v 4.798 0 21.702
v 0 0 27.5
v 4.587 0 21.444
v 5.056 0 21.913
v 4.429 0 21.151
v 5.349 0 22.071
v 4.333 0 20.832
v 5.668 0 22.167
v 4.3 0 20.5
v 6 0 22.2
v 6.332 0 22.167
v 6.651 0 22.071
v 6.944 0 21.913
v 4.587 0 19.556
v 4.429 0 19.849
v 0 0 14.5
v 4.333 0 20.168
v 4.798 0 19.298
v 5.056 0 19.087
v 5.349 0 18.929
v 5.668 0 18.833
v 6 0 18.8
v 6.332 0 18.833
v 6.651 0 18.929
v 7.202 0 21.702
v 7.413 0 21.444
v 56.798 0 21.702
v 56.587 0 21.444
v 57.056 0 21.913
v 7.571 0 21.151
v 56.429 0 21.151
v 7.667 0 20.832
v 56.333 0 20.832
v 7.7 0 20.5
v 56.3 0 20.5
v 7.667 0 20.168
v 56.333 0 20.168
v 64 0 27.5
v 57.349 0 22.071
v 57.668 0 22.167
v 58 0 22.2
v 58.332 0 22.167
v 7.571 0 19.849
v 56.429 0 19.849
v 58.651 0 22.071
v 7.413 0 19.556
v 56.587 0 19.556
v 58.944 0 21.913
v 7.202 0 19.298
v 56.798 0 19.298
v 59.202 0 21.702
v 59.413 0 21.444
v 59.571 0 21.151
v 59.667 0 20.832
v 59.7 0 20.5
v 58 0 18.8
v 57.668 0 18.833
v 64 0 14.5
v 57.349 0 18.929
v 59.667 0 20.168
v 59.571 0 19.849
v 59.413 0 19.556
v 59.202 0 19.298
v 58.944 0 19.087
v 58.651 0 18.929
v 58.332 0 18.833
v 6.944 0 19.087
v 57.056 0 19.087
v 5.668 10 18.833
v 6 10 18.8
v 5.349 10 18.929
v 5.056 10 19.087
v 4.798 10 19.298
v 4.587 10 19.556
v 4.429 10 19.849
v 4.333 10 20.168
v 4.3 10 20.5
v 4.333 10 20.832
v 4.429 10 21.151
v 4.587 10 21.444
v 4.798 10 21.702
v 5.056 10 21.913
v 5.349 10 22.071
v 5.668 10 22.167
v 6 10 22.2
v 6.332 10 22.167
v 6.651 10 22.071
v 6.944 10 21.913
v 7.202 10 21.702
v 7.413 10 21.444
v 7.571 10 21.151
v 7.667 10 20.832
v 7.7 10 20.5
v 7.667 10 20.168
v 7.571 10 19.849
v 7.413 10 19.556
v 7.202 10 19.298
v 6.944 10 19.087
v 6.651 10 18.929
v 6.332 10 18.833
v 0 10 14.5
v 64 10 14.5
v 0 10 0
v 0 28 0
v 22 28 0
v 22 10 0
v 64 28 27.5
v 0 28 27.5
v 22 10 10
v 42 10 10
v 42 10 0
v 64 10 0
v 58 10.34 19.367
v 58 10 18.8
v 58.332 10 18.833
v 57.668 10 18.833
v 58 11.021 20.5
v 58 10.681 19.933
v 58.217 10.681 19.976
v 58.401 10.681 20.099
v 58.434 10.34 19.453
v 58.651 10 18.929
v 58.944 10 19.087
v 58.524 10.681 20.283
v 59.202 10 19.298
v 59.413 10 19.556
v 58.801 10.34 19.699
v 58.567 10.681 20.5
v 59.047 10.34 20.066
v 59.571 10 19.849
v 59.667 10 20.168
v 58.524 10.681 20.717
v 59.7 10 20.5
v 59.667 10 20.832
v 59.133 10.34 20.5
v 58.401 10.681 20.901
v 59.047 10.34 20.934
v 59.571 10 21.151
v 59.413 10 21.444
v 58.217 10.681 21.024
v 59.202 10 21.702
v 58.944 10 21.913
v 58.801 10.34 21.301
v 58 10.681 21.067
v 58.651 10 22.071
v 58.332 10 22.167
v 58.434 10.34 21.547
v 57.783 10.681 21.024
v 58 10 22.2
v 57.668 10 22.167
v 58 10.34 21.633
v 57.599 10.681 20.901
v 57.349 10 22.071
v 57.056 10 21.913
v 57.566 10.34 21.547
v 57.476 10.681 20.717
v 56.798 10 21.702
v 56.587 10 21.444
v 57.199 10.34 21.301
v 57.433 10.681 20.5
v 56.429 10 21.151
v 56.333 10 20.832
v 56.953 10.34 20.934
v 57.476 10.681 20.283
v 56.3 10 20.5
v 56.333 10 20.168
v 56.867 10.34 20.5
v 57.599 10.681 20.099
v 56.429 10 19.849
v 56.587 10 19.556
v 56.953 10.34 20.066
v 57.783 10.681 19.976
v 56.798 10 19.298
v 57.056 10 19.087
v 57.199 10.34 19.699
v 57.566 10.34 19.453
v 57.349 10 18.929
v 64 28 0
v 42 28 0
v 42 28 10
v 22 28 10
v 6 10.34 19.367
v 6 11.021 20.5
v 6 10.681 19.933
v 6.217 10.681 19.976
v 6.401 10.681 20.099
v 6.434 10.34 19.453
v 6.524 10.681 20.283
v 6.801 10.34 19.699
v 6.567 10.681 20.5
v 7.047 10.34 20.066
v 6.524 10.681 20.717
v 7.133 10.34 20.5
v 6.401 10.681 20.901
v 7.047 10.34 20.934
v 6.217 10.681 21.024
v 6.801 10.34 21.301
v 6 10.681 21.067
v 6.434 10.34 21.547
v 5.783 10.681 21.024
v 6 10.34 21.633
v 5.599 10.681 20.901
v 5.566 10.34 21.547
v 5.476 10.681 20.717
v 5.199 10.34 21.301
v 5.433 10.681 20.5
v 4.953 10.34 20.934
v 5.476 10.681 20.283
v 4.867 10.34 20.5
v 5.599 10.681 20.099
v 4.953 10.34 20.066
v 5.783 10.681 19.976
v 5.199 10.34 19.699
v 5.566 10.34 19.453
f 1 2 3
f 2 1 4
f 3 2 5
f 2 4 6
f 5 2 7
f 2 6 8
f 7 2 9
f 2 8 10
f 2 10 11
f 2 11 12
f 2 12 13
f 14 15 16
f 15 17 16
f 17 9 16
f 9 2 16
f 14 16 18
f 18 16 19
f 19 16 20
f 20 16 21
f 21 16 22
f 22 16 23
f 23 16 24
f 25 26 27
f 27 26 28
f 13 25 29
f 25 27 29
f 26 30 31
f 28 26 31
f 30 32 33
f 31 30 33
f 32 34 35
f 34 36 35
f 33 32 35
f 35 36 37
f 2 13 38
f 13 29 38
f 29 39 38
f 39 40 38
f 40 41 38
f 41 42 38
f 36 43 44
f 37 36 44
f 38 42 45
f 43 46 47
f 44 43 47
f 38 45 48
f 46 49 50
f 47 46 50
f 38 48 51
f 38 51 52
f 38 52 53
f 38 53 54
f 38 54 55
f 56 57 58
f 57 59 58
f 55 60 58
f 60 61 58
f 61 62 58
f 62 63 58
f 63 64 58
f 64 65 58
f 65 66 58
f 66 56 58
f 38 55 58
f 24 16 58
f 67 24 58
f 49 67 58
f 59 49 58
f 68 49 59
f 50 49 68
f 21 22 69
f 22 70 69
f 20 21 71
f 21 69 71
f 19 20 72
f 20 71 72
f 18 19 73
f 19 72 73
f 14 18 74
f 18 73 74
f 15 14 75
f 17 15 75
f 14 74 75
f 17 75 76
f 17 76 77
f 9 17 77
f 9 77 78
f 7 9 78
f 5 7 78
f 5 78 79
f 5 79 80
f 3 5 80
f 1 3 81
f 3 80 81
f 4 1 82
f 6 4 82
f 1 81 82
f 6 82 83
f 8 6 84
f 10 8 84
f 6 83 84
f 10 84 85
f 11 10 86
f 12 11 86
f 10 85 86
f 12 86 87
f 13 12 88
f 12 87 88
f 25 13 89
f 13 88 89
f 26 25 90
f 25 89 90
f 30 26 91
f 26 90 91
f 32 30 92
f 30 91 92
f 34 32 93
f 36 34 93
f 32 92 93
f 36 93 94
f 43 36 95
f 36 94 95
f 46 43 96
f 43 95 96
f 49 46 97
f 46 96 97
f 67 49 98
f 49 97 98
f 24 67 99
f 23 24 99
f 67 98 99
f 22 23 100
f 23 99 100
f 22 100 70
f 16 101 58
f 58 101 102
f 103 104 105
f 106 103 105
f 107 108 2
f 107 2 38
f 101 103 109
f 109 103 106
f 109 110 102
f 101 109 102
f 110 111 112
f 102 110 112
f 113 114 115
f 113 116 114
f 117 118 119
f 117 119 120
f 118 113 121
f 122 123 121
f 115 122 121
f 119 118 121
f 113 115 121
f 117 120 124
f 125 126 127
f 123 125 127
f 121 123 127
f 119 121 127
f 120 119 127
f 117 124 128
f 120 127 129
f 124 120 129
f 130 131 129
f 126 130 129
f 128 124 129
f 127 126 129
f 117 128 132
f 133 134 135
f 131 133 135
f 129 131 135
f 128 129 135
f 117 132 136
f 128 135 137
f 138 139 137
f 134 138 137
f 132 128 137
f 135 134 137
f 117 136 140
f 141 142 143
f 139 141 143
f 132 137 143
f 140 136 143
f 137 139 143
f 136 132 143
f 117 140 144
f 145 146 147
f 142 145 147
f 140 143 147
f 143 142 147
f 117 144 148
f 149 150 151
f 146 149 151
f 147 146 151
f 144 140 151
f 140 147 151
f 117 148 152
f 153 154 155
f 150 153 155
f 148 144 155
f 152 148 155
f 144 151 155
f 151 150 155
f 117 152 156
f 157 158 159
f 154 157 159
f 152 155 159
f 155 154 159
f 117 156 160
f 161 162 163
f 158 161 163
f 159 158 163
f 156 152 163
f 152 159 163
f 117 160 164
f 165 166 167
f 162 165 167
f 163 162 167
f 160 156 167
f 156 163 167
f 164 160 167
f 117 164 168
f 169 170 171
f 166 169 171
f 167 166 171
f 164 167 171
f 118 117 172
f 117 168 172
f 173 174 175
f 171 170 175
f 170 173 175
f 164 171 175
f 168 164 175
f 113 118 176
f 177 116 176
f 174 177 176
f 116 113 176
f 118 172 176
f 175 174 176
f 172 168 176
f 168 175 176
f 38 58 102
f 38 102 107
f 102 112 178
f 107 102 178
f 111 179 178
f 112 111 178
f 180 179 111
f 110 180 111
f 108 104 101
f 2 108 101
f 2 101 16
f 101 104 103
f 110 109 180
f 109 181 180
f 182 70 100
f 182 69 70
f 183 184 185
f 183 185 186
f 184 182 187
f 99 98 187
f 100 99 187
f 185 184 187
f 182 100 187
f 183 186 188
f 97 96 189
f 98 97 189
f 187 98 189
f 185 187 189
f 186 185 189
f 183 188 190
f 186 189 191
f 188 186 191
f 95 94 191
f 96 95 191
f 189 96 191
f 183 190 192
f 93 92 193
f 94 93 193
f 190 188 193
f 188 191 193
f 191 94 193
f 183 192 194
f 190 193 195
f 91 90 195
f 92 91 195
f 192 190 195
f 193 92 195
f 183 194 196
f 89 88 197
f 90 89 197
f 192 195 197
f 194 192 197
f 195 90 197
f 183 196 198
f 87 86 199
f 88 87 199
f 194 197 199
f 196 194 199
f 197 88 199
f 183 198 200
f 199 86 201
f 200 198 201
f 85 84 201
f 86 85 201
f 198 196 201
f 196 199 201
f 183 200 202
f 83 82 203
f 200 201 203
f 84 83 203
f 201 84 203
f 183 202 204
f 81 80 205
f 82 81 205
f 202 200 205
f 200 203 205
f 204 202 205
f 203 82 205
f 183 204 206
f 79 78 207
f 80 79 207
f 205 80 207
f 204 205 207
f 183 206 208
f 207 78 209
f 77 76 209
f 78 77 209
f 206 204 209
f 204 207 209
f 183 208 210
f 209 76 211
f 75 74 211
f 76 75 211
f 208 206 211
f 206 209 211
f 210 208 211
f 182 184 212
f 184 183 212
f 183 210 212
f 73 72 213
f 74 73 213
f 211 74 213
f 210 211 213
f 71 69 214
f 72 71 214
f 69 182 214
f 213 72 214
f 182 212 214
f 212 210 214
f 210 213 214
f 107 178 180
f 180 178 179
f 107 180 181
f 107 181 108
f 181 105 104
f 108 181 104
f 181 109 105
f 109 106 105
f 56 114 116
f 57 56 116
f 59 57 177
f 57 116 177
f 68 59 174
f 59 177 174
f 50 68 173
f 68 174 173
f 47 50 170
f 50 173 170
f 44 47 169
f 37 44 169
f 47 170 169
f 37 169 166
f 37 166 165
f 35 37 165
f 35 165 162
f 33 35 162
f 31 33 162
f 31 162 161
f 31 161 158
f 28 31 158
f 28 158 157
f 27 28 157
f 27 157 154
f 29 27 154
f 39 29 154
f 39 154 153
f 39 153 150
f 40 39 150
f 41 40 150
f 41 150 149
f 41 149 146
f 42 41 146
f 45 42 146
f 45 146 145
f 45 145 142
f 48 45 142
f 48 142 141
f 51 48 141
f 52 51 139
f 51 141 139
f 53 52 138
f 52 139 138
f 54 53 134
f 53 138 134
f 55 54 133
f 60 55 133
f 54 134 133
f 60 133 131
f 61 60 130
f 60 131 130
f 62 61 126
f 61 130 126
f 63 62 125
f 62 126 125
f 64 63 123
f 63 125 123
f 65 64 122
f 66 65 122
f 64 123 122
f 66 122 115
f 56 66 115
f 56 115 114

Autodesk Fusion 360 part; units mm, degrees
sketch "Sketch1" plane through (0, 0, 0) normal (0, 0, 1) x (1, 0, 0)
  line L0 (0, 0) -> (64, 0)
  line L1 (64, 0) -> (64, 28)
  line L2 (64, 28) -> (0, 28)
  line L3 (0, 28) -> (0, 0)
  line L4 (0, 0) -> (0, 10)
  line L5 (0, 10) -> (64, 10)
  line L6 (32, 28) -> (42, 28)
  line L7 (32, 28) -> (22, 28)
  line L8 (22, 28) -> (42, 28)
  line L9 (42, 28) -> (42, 10)
  line L10 (42, 10) -> (22, 10)
  line L11 (22, 10) -> (22, 28)
  point P0 (32, 28)
  dimension "d1" = 64
  dimension "d2" = 28
  dimension "d3" = 10
extrude "Extrude1" add sketch "Sketch1" along normal blind 27.5
extrude "Extrude2" cut sketch "Sketch1" along normal blind 14.5 contours L0 L1 L3 L4 L5 L10
sketch "Sketch2" plane through (0, 0, 0) normal (0, -1, 0) x (1, 0, 0)
  line L0 (0, 14.5) -> (64, 14.5)
  line L1 (64, 14.5) -> (64, 27.5)
  line L2 (64, 27.5) -> (0, 27.5)
  line L3 (0, 27.5) -> (0, 14.5)
  line L4 (64, 14.5) -> (58, 14.5) construction
  line L5 (64, 14.5) -> (64, 20.5) construction
  line L6 (0, 14.5) -> (6, 14.5)
  line L7 (0, 14.5) -> (0, 20.5)
  point P0 (58, 20.5)
  point P1 (6, 20.5)
  dimension "d8" = 6
  dimension "d9" = 6
  dimension "d10" = 6
  dimension "d11" = 6
hole "Hole1" at (6, 0, 20.5) direction (0, 1, 0) diameter 3.4 depth 10 tip angle 118
hole "Hole2" at (58, 0, 20.5) direction (0, 1, 0) diameter 3.4 depth 10 tip angle 118
extrude "Extrude3" cut sketch "Sketch1" along normal blind 10 contours L2 L5 L6 L7 L8 L9 L10 L11
